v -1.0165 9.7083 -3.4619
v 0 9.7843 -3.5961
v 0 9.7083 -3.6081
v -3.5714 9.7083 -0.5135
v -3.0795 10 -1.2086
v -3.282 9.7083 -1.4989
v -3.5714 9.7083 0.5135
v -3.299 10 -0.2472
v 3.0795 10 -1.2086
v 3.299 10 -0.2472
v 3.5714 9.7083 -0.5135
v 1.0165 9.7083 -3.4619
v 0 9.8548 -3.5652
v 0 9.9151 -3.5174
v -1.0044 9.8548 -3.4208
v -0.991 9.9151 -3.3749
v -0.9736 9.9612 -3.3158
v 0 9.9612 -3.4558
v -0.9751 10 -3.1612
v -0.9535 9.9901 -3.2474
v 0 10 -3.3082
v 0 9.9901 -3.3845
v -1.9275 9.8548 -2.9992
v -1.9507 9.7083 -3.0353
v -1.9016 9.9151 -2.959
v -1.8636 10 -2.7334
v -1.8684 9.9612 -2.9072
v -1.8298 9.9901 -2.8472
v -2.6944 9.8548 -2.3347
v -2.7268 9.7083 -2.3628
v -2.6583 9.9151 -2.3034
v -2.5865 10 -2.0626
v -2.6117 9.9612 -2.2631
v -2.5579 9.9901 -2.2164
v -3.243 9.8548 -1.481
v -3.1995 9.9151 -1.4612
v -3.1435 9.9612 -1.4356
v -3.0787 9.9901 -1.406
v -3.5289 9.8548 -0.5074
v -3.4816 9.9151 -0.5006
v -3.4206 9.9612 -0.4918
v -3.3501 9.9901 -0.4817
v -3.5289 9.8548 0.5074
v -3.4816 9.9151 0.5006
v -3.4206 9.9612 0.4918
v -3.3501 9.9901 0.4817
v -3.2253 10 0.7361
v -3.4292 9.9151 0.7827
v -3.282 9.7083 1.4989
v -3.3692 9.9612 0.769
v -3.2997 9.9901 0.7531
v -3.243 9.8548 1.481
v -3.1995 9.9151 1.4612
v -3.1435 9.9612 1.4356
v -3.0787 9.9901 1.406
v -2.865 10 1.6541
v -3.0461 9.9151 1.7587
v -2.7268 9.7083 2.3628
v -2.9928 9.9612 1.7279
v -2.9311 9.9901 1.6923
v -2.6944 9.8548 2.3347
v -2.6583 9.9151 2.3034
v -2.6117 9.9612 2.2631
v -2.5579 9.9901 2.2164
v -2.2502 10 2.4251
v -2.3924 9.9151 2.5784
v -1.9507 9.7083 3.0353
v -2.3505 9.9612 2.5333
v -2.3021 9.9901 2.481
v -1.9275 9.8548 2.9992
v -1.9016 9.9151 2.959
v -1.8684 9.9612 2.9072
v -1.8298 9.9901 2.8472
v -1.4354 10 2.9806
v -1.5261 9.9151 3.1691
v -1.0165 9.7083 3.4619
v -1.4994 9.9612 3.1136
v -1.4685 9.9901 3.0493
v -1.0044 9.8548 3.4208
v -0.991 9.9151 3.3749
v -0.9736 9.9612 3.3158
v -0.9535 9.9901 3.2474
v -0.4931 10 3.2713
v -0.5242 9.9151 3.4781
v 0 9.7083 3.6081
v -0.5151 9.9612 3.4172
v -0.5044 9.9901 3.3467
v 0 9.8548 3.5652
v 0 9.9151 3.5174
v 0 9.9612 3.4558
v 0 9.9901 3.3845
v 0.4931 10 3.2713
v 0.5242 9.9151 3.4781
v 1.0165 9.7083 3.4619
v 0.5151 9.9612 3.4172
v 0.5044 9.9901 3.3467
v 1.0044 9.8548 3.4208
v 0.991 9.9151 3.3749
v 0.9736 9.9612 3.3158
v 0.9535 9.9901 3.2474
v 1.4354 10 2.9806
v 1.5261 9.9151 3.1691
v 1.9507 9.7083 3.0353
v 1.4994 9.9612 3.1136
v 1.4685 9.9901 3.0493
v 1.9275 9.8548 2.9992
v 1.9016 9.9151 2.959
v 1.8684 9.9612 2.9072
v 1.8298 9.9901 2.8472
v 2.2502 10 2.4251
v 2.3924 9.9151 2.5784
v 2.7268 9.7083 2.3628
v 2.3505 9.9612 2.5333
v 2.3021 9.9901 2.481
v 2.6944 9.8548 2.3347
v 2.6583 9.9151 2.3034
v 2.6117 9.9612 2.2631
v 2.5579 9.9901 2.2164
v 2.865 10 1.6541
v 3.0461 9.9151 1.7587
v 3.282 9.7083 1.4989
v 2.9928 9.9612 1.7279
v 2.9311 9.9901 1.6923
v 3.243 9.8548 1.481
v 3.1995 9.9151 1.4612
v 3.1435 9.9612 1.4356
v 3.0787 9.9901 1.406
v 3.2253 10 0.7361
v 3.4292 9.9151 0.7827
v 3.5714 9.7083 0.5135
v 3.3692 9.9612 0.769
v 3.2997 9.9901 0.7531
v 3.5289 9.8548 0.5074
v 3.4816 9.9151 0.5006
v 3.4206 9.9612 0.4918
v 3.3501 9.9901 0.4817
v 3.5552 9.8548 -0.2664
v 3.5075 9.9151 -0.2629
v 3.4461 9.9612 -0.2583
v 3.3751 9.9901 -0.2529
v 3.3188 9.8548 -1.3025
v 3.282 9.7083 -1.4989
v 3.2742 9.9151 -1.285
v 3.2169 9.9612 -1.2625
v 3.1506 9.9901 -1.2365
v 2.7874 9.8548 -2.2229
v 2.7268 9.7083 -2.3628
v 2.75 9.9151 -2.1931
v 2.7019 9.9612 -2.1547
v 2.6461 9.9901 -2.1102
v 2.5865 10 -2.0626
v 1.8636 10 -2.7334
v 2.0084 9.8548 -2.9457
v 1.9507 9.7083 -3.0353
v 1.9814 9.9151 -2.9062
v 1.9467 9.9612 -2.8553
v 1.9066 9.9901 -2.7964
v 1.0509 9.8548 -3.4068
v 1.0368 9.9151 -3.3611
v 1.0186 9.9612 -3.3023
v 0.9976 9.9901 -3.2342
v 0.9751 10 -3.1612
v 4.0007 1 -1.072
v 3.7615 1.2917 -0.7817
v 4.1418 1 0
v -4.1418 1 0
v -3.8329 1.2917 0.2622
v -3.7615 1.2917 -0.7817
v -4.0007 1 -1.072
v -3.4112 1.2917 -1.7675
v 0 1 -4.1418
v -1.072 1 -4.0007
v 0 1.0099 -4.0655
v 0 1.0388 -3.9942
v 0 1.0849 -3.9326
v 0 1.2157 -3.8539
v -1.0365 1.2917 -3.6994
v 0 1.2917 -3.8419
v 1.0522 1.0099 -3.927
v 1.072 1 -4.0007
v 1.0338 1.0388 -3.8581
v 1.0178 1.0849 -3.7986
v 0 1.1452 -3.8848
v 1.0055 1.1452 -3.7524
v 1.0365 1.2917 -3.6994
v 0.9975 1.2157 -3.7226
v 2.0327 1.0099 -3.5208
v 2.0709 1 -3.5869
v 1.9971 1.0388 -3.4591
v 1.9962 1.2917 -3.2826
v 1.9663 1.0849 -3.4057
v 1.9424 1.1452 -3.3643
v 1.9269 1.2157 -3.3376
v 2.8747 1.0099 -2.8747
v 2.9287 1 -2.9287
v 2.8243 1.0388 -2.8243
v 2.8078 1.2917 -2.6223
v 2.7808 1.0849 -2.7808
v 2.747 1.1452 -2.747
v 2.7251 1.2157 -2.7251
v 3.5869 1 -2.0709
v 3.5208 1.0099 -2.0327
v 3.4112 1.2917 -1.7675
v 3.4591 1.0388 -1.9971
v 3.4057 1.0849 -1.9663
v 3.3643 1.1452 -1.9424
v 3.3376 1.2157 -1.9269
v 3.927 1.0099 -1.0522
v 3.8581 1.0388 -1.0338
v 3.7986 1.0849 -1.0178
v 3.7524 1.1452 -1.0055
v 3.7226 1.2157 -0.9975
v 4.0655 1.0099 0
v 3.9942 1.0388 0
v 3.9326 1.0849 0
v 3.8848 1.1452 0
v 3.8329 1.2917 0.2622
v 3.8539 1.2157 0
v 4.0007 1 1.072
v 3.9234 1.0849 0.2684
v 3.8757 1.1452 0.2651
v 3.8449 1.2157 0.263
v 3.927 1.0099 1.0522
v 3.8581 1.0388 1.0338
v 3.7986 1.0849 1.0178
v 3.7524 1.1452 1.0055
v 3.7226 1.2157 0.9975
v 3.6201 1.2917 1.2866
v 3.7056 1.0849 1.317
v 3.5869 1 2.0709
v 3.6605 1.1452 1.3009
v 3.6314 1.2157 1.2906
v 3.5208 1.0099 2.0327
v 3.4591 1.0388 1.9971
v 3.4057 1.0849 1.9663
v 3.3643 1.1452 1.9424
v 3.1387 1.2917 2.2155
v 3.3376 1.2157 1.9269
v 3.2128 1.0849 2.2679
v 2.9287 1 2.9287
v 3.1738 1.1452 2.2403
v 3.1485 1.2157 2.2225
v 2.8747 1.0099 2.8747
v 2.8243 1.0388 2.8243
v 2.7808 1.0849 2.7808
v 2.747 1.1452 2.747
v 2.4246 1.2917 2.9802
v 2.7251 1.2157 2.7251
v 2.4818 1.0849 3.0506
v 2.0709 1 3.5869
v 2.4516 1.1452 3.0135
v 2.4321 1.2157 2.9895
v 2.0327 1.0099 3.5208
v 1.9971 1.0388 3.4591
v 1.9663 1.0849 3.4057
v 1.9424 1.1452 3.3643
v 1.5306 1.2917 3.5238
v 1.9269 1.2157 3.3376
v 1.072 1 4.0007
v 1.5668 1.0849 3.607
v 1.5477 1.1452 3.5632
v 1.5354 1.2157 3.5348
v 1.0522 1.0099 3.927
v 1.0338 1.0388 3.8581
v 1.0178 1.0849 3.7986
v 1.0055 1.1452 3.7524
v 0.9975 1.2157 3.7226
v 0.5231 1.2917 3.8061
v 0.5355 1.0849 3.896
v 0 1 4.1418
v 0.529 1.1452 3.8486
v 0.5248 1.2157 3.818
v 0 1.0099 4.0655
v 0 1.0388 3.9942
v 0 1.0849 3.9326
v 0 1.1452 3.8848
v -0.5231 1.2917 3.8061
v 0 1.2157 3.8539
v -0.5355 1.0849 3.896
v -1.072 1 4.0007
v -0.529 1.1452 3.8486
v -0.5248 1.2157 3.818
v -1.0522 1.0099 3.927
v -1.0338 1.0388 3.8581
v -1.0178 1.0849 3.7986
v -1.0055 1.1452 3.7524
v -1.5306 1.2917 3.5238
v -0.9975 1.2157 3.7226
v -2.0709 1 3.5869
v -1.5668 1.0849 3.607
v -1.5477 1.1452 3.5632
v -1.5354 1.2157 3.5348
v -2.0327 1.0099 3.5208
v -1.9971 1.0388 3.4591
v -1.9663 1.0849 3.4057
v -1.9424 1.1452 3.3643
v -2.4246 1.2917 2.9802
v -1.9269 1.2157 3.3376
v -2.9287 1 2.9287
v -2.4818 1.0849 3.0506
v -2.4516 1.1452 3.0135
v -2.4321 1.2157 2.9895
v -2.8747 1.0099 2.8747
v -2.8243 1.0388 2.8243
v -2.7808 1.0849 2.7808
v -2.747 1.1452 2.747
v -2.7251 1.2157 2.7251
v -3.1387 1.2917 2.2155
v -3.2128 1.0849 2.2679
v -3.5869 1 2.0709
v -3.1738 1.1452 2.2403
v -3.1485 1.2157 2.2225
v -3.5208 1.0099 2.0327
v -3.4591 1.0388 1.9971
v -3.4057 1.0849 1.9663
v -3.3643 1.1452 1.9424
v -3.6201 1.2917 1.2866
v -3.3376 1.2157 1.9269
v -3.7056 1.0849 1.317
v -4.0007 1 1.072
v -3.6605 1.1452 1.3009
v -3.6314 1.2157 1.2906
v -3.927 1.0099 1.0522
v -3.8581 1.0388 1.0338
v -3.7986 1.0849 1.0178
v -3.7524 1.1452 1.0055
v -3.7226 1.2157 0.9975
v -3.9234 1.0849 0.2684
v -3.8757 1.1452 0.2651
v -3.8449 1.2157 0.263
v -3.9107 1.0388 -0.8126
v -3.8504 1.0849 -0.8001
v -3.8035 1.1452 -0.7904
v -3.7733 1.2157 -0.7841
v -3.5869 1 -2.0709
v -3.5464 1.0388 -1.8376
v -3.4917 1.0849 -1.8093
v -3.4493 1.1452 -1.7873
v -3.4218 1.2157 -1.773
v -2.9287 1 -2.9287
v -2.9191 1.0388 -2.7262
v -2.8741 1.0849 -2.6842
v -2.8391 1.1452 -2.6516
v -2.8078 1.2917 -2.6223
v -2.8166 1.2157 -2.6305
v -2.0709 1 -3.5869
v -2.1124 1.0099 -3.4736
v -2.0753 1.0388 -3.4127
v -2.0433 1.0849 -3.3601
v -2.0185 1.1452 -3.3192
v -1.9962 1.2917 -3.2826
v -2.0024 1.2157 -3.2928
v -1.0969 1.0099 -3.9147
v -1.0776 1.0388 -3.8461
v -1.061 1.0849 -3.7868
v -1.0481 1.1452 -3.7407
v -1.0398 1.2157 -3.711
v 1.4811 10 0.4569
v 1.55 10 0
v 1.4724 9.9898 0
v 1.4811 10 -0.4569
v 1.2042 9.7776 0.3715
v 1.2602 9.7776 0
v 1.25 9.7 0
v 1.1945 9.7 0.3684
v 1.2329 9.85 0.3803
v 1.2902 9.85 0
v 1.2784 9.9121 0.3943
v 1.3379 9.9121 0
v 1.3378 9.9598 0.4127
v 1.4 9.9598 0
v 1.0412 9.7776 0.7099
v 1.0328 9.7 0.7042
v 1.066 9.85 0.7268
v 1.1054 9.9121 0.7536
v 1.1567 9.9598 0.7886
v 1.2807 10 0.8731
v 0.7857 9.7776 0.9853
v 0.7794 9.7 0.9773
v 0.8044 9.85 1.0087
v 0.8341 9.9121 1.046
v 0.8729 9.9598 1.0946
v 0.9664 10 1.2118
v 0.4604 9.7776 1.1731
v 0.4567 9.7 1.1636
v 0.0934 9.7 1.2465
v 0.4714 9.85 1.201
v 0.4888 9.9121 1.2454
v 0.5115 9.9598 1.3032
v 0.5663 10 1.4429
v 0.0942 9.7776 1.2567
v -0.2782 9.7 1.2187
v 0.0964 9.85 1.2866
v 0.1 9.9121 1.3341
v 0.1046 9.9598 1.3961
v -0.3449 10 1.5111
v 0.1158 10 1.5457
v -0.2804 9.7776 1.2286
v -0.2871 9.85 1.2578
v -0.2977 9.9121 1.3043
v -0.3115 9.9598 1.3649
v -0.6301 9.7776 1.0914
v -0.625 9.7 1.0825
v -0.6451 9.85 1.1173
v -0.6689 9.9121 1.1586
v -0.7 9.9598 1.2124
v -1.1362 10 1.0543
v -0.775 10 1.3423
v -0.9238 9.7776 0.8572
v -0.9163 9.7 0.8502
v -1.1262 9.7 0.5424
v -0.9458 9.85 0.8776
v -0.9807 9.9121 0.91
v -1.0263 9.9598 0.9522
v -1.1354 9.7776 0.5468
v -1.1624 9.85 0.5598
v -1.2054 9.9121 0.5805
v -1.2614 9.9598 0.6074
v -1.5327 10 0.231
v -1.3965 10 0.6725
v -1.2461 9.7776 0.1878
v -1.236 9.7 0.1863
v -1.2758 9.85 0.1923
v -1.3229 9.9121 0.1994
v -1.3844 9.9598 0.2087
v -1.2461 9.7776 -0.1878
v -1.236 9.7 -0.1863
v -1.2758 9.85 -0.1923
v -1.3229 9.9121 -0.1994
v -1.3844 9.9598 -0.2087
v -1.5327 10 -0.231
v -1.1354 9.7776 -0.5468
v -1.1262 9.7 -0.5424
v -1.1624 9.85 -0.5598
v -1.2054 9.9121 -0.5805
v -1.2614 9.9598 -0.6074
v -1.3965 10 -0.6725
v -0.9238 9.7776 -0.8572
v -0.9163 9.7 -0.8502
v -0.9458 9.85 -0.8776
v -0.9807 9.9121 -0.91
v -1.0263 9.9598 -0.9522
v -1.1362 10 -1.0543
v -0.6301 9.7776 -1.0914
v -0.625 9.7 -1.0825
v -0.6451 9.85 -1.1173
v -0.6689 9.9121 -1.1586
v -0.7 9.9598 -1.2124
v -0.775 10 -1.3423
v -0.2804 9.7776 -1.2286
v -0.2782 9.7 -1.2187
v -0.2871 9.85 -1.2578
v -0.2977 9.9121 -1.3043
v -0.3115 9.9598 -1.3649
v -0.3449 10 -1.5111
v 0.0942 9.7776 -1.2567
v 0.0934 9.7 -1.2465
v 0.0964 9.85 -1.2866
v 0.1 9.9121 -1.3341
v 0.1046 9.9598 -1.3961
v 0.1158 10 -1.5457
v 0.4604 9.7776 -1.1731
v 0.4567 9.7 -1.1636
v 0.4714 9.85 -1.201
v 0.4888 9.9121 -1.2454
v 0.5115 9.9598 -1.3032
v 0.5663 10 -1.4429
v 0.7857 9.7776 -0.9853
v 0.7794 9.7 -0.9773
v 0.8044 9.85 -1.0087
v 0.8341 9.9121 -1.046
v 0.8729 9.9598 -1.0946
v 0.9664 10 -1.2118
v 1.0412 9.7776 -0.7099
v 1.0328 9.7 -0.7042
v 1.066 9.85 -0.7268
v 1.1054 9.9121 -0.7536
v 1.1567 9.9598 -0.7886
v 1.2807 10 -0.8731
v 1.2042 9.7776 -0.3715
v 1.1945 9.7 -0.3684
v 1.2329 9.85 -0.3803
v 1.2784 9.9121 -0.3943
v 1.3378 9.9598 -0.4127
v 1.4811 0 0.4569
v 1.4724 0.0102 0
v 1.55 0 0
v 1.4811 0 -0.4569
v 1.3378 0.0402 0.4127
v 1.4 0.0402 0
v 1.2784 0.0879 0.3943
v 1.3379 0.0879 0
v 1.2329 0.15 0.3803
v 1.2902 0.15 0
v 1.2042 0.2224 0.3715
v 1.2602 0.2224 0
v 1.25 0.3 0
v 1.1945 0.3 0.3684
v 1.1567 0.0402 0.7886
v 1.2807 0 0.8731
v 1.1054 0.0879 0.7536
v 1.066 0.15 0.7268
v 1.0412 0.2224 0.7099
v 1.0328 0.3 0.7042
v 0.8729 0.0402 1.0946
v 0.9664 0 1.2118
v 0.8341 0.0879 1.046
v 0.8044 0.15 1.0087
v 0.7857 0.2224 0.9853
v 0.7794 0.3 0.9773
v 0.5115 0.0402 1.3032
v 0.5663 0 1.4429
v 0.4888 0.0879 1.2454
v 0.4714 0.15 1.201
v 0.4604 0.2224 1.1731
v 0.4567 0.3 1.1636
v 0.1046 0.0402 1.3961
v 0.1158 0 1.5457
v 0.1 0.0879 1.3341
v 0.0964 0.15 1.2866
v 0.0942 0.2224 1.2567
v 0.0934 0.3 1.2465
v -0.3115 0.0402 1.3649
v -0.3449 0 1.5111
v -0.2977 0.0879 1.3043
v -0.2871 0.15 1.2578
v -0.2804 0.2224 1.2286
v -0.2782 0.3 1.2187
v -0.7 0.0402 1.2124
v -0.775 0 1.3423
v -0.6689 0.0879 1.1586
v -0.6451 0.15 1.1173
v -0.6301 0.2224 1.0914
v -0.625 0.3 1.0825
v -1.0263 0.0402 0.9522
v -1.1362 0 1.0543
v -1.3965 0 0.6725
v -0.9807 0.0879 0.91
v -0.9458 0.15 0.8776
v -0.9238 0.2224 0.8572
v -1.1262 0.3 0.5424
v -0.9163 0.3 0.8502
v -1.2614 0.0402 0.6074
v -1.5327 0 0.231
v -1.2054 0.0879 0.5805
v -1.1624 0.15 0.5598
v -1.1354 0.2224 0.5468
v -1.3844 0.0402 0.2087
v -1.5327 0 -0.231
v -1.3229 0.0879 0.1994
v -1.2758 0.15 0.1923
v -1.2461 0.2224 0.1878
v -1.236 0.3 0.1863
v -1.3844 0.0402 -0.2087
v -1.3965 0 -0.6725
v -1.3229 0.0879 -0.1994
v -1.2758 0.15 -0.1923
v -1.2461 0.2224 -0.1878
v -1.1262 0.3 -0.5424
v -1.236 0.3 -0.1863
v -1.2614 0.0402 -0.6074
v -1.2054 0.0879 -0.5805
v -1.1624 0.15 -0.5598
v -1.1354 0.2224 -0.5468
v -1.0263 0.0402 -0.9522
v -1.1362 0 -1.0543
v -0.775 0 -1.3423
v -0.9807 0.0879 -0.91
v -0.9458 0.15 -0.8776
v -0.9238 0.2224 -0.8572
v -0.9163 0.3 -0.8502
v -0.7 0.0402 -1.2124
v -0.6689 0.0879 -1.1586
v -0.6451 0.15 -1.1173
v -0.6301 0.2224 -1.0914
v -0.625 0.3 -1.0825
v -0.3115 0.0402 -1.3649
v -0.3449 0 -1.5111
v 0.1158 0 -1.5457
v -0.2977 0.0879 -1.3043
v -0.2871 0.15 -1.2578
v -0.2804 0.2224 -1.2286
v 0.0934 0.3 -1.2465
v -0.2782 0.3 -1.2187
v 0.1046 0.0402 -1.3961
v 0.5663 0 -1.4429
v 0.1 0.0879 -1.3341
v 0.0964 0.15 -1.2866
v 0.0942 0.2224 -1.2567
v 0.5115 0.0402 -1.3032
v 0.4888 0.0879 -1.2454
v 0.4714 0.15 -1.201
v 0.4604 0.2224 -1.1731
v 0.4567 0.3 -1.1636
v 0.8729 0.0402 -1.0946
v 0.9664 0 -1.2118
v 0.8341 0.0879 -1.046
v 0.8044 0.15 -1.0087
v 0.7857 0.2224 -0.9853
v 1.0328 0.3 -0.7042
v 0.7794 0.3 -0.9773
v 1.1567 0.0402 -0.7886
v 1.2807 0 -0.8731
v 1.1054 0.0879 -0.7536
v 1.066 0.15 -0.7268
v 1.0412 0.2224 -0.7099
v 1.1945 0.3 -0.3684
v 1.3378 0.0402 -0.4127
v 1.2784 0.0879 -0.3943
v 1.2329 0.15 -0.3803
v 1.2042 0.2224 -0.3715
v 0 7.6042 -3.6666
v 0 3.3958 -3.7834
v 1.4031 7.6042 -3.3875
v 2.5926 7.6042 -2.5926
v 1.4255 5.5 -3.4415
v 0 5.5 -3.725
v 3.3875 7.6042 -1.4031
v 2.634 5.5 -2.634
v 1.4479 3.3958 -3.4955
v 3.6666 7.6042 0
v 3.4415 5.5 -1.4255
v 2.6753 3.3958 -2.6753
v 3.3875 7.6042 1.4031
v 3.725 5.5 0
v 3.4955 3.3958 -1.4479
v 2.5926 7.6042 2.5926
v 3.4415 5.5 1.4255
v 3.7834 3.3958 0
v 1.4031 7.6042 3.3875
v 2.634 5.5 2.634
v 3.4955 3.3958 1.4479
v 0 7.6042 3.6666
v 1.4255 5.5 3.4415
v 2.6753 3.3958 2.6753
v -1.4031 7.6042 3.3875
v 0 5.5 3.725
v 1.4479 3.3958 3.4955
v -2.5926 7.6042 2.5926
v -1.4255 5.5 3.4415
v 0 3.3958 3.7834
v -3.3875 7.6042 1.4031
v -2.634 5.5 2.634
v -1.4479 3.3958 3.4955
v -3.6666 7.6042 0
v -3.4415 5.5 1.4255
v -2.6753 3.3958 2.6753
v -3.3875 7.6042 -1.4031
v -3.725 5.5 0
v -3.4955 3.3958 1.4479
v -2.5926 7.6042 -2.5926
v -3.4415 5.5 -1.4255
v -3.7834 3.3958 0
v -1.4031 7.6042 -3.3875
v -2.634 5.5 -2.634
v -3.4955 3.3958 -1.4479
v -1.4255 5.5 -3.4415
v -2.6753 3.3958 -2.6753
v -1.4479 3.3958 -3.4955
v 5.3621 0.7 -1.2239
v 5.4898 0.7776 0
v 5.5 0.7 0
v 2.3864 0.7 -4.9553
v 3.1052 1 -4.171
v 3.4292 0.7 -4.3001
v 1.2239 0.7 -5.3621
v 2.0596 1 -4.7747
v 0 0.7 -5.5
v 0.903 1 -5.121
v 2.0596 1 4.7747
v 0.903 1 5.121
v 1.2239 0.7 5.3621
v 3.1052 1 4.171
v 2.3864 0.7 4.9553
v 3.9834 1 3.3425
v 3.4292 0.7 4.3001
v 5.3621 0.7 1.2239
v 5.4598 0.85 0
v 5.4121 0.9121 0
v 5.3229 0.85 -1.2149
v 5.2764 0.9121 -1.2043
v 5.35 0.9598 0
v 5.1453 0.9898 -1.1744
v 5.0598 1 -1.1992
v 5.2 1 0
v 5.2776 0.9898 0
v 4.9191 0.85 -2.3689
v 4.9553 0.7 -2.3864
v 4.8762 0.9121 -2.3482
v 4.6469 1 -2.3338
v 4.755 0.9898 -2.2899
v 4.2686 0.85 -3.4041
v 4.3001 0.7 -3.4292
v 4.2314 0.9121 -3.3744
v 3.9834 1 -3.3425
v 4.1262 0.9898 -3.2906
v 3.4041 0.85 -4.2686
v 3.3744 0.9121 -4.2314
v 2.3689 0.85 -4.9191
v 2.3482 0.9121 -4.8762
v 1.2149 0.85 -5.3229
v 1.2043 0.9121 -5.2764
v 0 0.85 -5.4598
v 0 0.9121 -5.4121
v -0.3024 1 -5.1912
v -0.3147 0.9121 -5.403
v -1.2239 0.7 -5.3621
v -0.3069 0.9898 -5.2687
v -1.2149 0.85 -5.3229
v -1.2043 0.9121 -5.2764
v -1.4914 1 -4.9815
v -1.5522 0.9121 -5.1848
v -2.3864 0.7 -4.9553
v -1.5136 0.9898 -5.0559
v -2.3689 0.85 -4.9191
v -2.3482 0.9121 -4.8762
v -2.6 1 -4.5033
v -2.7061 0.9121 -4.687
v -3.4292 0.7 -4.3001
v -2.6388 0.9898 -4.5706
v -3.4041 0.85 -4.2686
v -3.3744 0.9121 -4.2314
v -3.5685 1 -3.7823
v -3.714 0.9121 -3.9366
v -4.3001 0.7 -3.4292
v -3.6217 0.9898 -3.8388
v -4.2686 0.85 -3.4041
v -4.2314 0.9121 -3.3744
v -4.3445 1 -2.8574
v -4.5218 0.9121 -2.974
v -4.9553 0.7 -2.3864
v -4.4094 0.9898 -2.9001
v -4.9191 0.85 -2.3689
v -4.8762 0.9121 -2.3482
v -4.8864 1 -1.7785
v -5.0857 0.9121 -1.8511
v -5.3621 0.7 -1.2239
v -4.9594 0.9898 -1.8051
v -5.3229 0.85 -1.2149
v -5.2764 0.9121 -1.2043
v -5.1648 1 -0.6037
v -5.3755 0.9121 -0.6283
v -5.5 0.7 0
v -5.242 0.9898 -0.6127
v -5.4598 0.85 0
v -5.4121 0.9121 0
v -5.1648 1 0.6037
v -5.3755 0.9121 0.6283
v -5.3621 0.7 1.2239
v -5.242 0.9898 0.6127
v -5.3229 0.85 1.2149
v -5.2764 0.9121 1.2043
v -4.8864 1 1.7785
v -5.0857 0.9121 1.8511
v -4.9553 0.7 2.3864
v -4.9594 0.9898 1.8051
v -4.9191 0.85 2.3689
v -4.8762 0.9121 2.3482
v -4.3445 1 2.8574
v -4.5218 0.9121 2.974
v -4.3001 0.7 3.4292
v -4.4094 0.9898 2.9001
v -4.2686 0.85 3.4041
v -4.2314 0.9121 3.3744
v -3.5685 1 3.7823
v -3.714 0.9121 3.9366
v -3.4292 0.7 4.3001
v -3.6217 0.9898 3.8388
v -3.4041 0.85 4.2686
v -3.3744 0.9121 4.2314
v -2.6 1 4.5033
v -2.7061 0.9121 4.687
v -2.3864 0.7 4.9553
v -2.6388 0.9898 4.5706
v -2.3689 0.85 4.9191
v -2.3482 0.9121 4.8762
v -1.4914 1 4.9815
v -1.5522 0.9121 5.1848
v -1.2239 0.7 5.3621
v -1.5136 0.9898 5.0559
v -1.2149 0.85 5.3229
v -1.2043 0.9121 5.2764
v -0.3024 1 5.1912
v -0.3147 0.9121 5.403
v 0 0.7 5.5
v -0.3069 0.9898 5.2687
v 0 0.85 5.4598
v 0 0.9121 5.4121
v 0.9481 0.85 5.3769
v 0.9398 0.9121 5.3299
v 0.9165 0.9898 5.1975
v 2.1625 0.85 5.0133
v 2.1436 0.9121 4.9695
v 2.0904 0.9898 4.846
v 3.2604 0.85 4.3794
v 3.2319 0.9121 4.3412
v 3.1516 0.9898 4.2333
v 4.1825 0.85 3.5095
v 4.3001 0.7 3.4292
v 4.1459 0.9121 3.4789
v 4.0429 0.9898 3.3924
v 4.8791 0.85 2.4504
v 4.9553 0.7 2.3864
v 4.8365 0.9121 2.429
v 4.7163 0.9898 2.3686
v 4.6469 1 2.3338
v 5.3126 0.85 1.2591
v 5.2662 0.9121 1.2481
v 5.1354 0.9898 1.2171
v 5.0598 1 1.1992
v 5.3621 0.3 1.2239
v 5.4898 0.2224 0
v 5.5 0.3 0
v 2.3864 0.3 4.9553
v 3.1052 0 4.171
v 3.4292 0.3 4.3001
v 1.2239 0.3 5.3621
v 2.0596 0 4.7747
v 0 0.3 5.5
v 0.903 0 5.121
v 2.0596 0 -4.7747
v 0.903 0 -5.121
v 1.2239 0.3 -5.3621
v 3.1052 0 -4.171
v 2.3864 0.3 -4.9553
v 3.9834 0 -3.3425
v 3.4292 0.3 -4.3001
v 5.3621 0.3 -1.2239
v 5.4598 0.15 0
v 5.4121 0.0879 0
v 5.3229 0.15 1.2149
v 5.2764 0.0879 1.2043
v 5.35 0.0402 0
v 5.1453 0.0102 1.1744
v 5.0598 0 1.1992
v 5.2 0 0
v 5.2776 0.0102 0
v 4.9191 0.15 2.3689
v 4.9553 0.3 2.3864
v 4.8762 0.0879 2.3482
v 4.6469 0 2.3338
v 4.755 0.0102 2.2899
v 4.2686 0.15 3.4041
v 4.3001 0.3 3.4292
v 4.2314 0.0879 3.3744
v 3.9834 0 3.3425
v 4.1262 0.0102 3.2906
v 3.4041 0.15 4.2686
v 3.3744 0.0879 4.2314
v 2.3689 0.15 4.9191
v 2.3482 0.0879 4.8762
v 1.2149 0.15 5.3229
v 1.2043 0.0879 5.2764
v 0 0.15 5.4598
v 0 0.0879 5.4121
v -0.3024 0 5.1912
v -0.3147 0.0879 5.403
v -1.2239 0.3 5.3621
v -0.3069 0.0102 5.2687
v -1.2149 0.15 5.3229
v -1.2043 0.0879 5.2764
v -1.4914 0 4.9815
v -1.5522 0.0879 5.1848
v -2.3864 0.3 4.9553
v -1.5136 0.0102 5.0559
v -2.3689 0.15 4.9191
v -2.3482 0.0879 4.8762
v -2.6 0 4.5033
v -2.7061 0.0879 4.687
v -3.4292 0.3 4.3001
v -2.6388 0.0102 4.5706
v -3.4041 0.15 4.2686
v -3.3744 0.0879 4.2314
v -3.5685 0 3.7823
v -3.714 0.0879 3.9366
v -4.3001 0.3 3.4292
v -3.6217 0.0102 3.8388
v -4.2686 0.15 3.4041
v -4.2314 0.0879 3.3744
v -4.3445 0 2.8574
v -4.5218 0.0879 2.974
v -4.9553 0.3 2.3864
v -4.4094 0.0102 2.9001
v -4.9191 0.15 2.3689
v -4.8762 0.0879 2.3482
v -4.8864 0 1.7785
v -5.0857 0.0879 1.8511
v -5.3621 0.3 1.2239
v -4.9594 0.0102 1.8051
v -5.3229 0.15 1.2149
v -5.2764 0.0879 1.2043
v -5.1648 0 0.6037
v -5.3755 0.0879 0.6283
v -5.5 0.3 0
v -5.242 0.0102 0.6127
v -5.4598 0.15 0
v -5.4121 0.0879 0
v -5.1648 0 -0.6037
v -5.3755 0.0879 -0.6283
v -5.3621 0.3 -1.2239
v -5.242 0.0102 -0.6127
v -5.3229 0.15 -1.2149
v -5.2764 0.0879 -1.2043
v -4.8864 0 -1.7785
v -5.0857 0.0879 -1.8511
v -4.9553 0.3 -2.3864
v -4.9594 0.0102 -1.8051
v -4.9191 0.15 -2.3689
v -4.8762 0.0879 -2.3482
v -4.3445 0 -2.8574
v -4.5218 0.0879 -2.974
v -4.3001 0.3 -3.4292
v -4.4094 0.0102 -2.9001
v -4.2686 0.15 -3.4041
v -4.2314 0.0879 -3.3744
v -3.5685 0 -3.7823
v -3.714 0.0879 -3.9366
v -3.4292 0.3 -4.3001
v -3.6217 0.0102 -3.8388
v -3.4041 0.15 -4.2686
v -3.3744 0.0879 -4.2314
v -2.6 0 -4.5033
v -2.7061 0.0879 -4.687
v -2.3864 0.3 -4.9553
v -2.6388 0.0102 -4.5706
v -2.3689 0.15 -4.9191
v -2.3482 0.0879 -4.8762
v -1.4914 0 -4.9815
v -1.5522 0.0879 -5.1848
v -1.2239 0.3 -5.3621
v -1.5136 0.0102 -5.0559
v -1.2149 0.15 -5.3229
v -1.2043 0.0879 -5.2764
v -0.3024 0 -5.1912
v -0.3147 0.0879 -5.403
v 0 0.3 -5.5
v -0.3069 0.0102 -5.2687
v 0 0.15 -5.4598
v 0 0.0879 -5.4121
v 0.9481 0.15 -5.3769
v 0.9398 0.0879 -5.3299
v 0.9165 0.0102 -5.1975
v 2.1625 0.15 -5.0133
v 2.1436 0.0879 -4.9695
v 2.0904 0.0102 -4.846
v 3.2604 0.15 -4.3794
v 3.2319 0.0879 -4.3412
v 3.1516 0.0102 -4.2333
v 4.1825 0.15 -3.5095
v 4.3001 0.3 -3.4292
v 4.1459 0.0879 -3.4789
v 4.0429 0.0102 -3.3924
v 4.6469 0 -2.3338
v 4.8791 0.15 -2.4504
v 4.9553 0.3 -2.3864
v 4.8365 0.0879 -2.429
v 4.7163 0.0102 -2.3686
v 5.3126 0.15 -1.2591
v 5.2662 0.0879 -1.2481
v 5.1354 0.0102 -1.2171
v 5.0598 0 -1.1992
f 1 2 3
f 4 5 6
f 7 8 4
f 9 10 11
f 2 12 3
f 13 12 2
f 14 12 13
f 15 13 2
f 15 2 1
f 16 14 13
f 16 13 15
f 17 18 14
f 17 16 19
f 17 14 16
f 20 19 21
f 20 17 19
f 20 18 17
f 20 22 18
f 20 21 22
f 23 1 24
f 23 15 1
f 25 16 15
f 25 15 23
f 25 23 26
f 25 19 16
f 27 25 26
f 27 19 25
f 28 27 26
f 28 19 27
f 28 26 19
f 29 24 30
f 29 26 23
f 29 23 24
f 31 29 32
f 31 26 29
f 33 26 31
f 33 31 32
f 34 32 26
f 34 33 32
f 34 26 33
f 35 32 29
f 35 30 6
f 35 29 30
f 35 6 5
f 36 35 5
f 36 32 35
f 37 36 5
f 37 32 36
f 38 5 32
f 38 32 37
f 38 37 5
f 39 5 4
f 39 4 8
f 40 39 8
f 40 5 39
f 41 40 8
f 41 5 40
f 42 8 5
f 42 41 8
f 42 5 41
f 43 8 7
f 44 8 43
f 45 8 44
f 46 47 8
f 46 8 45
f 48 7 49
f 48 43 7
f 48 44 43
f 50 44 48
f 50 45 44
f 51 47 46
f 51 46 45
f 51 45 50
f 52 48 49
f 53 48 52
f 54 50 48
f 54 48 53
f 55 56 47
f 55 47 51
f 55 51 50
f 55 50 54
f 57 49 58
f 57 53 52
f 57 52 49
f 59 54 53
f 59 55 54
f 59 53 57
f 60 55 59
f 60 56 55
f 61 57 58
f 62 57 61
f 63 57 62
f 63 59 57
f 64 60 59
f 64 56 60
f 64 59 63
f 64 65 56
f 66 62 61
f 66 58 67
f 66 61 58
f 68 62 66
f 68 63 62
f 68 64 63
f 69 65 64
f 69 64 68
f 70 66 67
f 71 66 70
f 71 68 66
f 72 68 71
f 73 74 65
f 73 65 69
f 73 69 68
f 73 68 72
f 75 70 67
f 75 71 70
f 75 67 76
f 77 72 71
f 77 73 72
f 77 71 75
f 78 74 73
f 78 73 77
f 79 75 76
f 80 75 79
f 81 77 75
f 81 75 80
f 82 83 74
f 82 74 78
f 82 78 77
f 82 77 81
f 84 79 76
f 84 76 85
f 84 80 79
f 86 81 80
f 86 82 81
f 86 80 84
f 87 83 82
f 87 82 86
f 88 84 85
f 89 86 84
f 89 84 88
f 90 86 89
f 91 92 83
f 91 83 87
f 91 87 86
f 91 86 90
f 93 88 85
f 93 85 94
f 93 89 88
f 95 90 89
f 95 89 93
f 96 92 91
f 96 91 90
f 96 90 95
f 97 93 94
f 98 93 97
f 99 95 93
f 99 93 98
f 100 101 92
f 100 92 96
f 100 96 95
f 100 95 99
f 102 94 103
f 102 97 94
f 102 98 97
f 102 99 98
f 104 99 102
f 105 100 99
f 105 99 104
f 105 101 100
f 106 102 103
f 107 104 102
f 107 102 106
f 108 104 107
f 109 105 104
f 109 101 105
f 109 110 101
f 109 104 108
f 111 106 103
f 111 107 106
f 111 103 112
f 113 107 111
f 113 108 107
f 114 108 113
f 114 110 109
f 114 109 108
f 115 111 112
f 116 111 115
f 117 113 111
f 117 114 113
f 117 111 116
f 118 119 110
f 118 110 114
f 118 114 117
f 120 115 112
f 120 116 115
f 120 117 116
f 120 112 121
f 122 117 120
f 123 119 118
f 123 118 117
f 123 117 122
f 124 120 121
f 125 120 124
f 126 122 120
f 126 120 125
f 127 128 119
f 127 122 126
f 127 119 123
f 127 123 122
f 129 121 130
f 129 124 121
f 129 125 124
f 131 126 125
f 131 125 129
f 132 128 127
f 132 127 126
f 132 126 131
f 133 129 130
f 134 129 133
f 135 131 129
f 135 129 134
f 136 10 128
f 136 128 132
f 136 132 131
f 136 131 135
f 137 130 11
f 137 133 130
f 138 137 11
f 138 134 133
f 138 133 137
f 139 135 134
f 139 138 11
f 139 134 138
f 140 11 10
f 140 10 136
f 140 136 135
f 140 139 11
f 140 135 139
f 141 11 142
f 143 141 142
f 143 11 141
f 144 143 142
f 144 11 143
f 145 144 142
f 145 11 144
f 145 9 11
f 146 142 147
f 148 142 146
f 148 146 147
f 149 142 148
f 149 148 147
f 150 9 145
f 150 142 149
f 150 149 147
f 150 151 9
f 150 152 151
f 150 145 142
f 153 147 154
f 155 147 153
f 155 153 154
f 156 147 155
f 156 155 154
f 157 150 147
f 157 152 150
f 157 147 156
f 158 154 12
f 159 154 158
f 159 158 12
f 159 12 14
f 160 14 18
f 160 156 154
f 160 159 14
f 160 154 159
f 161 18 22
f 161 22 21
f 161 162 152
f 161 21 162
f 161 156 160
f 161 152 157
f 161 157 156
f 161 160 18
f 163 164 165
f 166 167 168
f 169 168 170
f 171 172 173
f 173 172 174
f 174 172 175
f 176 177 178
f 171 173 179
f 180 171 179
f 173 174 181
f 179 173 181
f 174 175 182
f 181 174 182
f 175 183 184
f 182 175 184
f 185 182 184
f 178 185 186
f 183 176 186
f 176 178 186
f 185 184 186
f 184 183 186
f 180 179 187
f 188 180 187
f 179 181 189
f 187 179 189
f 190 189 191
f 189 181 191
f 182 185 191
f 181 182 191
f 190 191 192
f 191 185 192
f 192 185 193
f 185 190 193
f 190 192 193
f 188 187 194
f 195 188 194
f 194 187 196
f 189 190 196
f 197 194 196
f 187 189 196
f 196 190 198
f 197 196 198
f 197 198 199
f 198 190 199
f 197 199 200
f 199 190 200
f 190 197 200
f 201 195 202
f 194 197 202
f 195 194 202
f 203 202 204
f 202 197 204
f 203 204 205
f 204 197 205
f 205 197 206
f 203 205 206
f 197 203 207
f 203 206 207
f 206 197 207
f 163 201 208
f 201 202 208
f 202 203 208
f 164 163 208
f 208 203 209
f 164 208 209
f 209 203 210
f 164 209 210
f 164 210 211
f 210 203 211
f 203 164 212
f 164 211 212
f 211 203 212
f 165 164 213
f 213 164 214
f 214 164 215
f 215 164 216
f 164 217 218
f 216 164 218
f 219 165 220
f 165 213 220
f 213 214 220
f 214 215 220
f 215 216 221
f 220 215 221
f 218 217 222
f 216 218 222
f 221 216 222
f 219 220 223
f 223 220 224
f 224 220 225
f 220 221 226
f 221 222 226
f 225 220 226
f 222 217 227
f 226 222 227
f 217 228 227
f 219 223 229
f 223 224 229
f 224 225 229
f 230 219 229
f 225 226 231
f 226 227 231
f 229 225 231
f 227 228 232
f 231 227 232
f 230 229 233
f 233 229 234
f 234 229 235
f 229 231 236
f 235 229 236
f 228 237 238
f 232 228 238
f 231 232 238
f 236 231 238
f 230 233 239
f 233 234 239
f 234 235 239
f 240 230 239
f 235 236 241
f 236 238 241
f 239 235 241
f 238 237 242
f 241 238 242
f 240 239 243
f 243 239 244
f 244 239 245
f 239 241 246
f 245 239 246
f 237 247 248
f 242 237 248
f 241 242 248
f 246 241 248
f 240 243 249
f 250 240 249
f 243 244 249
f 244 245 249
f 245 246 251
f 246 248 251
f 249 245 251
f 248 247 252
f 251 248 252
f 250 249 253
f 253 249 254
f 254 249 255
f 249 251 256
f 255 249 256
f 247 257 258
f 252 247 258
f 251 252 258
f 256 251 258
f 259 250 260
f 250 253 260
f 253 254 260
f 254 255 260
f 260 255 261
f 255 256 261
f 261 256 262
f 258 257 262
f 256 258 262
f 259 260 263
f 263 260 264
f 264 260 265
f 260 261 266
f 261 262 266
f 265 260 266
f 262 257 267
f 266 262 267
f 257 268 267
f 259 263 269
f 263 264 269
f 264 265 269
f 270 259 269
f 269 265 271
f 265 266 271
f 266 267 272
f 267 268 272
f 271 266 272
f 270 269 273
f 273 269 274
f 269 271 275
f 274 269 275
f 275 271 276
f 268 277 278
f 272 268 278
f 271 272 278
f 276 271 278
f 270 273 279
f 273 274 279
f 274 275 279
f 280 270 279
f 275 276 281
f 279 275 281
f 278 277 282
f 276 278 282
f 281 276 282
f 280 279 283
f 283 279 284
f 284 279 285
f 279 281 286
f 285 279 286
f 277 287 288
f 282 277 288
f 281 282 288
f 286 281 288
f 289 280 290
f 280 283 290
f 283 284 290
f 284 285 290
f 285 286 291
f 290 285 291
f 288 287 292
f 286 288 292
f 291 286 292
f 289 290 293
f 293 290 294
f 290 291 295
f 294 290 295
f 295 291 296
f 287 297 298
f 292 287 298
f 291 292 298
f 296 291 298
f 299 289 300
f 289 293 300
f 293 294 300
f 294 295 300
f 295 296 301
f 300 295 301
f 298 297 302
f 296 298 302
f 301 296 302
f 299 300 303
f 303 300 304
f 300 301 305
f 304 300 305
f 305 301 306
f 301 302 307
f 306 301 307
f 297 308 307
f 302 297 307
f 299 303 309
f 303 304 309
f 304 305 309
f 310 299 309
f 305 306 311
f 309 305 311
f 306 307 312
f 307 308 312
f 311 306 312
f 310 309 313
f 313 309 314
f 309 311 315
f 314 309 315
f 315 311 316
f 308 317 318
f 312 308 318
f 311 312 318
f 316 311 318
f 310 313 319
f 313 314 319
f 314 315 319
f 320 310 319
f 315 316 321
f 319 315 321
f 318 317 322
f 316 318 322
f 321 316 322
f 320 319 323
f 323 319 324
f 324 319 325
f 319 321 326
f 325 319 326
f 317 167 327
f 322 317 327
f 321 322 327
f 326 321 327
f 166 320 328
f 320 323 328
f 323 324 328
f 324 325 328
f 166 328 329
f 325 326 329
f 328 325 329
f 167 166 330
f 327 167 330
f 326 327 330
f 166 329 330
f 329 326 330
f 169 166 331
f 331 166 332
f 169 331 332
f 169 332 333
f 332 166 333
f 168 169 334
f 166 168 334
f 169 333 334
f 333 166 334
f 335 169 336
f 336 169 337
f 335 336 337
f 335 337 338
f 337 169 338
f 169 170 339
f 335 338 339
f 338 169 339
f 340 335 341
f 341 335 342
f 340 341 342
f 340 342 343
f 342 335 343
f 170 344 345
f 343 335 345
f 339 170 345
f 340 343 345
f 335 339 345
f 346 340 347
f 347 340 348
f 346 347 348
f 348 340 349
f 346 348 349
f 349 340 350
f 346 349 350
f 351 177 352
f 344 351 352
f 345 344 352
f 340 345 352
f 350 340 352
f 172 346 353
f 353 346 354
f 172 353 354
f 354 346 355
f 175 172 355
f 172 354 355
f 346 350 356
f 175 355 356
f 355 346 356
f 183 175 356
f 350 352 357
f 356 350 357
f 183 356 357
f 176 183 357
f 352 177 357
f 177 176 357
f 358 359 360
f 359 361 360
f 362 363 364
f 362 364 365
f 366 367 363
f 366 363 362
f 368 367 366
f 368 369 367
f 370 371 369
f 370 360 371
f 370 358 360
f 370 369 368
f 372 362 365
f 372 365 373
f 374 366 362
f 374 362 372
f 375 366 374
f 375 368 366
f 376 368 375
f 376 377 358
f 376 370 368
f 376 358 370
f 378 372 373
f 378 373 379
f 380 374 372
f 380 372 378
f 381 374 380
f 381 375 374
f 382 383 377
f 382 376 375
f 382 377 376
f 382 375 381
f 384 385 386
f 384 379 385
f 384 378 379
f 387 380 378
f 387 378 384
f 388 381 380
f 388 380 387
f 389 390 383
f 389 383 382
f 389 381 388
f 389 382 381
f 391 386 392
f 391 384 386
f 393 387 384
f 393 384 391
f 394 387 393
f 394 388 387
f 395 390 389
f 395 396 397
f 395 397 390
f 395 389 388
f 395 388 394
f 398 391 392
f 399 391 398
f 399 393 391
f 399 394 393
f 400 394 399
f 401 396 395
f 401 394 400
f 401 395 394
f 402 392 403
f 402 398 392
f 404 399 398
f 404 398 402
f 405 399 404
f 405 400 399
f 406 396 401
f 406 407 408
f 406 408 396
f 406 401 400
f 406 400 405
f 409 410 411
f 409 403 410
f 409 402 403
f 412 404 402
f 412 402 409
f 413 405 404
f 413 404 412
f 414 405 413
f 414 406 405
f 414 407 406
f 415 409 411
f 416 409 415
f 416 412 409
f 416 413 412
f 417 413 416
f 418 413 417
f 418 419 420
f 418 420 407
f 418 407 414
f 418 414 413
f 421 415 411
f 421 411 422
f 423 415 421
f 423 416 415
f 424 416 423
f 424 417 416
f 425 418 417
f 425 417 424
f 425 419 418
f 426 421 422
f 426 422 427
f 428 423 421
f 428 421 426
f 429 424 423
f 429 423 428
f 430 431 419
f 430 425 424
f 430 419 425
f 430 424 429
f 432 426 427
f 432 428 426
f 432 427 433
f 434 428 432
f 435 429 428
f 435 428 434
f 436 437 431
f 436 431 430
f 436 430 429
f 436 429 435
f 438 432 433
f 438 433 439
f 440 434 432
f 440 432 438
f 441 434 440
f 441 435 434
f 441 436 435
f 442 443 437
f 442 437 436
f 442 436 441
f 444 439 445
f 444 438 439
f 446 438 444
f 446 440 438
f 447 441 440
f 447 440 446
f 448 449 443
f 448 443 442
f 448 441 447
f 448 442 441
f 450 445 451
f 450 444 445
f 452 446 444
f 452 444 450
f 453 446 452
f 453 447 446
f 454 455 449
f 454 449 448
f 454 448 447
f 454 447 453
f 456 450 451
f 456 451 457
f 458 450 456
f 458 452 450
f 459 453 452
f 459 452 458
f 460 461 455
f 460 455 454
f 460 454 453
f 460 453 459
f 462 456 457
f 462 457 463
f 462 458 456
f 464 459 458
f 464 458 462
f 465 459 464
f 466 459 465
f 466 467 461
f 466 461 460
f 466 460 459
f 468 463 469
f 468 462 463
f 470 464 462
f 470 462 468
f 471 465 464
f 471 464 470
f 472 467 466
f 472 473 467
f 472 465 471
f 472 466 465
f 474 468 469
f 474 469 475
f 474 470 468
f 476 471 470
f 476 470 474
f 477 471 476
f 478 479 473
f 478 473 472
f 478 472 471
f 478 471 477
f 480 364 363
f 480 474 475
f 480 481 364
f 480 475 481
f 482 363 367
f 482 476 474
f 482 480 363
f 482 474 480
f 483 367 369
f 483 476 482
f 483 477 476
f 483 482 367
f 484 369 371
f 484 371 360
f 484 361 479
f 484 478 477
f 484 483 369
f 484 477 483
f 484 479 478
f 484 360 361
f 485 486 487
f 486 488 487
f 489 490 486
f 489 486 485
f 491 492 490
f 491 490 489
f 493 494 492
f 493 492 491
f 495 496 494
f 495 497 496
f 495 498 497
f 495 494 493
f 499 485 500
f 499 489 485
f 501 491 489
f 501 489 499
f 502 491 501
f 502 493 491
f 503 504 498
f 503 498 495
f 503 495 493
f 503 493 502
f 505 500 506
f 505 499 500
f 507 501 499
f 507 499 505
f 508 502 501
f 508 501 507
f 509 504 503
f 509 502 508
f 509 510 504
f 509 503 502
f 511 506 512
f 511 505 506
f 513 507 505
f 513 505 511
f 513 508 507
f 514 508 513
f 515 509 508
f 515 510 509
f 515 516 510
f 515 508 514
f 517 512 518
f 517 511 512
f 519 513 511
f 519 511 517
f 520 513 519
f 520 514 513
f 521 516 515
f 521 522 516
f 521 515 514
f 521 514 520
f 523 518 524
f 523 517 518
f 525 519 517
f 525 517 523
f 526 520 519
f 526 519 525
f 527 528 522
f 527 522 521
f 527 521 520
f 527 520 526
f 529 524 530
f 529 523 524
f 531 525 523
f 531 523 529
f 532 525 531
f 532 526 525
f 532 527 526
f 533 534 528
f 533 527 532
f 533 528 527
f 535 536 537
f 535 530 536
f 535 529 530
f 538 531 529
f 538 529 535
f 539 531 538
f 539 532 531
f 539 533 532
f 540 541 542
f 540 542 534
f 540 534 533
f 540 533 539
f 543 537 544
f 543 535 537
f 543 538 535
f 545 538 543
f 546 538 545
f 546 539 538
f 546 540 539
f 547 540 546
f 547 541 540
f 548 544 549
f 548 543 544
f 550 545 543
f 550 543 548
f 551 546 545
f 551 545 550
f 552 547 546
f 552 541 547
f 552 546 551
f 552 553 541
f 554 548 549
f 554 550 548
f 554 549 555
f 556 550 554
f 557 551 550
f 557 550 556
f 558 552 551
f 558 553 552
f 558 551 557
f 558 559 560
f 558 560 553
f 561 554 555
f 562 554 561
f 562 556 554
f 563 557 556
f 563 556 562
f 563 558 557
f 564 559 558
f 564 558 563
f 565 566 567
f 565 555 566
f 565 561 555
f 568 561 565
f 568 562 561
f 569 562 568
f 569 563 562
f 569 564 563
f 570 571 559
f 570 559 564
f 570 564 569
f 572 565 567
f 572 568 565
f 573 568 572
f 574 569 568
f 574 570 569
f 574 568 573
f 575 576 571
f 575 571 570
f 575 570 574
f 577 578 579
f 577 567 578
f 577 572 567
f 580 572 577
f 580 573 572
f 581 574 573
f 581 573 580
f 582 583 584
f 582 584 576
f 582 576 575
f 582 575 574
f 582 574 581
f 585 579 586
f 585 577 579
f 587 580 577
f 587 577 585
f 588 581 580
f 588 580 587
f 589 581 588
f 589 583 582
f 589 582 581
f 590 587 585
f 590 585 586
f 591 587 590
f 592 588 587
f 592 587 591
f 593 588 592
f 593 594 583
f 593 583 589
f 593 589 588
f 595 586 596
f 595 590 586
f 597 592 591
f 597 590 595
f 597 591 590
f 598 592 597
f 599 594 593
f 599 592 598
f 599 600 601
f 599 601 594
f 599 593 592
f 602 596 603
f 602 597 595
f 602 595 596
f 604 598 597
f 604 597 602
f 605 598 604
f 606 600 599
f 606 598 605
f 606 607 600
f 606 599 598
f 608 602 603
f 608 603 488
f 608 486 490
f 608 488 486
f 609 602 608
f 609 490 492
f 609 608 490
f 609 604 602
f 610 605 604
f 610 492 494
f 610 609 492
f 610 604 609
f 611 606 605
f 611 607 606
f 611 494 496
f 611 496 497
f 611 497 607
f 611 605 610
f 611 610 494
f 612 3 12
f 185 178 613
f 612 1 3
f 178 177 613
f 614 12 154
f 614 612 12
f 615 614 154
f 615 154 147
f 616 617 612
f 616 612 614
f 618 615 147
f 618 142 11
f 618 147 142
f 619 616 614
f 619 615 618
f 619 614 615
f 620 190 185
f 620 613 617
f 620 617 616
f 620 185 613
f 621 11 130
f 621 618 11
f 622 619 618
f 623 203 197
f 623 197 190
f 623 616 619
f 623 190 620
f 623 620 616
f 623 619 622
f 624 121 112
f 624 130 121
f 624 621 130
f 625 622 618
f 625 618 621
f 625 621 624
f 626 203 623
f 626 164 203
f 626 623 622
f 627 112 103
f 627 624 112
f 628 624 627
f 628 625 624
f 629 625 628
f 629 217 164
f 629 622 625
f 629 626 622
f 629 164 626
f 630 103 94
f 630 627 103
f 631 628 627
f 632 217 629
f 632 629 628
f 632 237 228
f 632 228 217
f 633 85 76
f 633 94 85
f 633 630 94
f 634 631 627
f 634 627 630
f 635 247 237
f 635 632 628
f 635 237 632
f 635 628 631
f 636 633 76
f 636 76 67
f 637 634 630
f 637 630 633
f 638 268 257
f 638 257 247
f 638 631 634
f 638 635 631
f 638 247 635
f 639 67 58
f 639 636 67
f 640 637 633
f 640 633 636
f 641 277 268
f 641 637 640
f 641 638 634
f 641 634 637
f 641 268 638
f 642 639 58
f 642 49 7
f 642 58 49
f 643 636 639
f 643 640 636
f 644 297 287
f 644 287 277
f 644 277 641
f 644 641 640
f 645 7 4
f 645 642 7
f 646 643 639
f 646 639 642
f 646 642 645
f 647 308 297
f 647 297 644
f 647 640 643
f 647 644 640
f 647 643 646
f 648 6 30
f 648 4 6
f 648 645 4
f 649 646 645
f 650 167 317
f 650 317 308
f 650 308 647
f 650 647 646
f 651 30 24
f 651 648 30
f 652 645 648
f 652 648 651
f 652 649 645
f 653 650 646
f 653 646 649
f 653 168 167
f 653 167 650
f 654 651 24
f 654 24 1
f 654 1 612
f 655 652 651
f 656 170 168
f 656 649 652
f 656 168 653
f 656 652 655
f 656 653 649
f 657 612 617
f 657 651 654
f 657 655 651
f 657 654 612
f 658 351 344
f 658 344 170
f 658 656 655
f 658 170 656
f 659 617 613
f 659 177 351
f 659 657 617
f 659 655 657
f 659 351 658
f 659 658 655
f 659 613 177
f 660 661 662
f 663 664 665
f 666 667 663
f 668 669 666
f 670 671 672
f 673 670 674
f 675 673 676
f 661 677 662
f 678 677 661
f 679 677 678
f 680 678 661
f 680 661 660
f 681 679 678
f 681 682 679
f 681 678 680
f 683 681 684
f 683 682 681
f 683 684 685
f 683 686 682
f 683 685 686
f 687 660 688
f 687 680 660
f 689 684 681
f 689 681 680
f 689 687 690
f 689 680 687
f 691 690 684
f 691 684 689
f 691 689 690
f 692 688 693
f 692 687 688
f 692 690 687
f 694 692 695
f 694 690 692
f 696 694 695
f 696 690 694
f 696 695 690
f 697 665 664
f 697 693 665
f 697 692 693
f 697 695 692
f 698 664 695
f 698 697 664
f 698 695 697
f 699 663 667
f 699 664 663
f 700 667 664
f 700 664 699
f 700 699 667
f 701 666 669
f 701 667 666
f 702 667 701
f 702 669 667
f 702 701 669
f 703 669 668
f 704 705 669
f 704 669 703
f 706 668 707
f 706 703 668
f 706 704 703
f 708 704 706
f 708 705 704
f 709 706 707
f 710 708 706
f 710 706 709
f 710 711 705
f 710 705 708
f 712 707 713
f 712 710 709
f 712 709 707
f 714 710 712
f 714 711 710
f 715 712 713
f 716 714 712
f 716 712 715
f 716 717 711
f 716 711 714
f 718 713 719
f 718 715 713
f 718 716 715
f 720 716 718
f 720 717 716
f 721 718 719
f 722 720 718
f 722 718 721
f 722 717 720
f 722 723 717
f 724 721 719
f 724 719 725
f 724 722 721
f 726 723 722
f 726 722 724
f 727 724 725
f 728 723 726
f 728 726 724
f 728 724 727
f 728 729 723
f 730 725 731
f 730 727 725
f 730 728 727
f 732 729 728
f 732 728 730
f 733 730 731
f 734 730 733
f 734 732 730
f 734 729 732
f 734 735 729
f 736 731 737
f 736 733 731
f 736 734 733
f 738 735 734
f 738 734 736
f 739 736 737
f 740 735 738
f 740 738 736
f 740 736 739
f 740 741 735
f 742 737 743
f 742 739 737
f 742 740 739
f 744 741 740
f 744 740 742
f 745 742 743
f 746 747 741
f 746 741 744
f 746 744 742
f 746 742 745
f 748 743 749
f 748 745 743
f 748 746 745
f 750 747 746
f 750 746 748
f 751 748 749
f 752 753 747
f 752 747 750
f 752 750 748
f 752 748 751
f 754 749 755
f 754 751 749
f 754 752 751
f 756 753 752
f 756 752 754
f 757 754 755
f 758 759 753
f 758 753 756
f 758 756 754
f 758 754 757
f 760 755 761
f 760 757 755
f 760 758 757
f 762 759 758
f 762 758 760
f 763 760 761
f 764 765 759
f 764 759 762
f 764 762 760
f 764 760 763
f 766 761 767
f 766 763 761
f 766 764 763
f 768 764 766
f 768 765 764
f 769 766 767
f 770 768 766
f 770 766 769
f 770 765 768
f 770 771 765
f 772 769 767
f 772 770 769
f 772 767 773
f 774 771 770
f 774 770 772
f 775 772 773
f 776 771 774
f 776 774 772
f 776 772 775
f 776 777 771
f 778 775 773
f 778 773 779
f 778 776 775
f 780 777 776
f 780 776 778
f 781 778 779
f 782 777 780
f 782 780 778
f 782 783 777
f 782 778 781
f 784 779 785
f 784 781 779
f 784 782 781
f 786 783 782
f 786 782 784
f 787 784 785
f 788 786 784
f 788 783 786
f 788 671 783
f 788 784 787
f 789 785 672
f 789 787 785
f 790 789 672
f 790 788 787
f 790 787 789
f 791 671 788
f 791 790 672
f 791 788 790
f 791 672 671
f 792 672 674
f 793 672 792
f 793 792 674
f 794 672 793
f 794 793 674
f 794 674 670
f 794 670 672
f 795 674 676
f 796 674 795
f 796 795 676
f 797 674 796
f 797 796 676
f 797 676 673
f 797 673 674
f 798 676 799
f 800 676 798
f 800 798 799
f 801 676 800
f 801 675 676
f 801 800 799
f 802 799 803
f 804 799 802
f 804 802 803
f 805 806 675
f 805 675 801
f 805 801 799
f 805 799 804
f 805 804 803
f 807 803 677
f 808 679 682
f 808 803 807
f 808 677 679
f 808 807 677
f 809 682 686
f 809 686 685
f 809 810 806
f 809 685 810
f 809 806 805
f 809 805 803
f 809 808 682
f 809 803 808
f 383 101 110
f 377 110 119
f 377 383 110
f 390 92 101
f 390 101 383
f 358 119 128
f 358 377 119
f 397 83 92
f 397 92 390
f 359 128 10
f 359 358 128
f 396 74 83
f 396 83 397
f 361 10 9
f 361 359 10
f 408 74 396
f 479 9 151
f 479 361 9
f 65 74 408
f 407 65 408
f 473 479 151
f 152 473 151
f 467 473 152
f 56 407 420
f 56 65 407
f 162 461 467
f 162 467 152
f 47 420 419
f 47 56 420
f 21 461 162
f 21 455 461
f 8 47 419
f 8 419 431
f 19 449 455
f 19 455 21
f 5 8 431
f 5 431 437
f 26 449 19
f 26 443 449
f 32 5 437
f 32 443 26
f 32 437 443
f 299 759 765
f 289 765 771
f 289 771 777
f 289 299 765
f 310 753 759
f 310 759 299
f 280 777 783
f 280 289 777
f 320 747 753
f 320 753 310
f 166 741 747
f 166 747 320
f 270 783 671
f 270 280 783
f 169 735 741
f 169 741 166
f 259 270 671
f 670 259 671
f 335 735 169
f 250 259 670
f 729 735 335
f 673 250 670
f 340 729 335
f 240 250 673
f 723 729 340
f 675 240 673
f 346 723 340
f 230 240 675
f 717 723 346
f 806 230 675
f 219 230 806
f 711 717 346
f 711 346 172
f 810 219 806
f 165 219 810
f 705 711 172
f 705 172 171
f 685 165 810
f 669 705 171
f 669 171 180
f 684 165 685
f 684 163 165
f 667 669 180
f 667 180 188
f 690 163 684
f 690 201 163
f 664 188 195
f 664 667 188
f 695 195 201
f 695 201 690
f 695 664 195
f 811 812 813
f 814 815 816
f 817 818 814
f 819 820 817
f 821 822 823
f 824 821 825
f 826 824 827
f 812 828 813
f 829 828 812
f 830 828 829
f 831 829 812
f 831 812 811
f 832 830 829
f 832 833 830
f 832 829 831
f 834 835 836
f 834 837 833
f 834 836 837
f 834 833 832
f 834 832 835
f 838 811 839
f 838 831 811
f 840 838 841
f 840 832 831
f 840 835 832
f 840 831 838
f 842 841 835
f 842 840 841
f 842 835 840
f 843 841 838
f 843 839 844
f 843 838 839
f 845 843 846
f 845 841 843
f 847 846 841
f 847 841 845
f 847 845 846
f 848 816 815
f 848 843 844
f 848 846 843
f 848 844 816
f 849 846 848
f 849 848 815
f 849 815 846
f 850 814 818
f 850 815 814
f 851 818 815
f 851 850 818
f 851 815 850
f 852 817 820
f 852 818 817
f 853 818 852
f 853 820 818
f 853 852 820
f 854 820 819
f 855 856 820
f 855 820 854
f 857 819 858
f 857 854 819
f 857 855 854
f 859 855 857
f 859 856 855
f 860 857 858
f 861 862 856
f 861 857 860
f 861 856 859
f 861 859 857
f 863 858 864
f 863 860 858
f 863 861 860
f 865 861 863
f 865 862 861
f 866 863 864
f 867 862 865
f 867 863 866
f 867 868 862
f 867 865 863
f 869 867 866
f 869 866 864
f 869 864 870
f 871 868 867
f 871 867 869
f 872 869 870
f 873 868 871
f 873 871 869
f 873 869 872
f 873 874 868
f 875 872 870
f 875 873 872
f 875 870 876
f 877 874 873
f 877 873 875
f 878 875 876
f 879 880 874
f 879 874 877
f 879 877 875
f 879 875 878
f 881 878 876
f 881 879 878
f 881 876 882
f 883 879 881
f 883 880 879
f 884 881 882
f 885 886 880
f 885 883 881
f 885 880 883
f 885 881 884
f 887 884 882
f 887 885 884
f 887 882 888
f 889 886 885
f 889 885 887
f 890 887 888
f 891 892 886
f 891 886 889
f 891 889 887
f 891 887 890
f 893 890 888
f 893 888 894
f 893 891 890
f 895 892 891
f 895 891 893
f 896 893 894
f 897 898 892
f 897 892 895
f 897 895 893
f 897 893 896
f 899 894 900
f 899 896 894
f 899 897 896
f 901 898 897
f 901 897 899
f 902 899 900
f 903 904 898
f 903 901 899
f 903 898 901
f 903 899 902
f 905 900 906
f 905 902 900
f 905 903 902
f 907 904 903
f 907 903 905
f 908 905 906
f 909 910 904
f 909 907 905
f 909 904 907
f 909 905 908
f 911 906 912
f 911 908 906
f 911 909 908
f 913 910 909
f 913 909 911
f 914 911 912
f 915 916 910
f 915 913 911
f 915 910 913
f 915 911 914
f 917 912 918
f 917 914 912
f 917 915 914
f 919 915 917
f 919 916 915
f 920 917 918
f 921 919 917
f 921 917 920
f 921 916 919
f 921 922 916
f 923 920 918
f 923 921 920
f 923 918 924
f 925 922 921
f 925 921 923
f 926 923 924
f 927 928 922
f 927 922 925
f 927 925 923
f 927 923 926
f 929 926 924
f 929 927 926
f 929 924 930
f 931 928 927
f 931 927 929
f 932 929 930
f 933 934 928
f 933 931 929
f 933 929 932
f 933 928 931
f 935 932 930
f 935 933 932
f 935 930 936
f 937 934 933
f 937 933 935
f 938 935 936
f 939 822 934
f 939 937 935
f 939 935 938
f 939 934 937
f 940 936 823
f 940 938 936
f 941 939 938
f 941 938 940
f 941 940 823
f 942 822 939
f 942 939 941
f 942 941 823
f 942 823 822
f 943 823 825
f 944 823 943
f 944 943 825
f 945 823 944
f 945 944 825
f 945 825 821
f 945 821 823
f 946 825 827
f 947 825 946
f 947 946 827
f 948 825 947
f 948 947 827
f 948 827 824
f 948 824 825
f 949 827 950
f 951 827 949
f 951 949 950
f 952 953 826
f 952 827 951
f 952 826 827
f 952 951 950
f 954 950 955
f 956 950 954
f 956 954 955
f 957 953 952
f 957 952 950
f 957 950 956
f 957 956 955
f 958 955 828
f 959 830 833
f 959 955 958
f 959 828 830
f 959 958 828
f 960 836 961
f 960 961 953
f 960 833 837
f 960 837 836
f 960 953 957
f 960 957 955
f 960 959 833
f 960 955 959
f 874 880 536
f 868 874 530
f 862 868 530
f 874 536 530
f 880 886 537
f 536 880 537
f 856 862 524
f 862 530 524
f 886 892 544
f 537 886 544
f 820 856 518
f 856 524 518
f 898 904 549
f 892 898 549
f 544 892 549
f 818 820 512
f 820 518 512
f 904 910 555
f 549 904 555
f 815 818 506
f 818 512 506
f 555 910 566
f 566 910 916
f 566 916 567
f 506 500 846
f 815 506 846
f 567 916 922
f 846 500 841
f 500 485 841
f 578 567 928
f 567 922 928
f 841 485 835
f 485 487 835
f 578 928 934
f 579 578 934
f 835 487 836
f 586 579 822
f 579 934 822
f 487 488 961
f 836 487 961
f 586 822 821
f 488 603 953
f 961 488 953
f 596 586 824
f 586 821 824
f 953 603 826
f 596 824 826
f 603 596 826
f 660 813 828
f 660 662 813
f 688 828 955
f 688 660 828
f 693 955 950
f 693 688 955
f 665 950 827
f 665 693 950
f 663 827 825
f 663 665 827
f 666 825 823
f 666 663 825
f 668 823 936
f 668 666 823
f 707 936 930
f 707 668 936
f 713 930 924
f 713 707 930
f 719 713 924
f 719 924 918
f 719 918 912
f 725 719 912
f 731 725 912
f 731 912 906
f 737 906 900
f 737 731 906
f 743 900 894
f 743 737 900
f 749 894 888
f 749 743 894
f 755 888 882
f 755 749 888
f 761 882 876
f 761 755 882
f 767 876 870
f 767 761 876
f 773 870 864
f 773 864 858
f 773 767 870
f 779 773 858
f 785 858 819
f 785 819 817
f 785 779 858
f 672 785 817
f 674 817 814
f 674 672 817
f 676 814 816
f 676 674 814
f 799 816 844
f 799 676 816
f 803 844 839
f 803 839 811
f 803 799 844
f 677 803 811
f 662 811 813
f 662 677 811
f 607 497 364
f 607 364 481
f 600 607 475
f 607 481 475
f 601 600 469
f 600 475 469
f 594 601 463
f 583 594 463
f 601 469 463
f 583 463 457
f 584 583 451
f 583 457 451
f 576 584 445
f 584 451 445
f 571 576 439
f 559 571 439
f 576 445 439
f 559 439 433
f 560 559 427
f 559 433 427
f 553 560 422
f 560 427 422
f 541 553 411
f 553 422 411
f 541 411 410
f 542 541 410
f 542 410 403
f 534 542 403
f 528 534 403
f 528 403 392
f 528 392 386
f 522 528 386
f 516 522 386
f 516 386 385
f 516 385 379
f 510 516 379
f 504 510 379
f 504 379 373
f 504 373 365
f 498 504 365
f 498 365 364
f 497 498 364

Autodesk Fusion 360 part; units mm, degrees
cylinder "Grundkörper Zylinder1" add diameter 11 height 1 placed x (1, 0, 0) y (0, 0, -1) z (0, 1, 0) at (0, 0, 0)
sketch "Skizze2" plane through (0, 0, 0) normal (1, 0, 0) x (0, 0, -1)
  line L0 (0, 1) -> (0, 10)
  line L1 (0, 10) -> (3.6, 10)
  line L2 (0, 1) -> (3.85, 1)
  line L3 (3.85, 1) -> (3.6, 10)
  dimension "d3" = 3.6
  dimension "d4" = 3.85
  dimension "d5" = 9
revolve "Drehen1" add sketch "Skizze2" angle 360 about axis through (0, 1, 0) along (0, 1, 0)
cylinder "Grundkörper Zylinder2" cut diameter 2.5 height -23 placed x (1, 0, 0) y (0, 0, -1) z (0, 1, 0) at (0, 10, 0)
fillet "Abrundung1" radius 0.3 6 faces at (5.4727, 0.6667, 0.5476) (4.9259, 1, 0.3691) (0.21, 10, -2.8021) (1.2438, 6.6667, 0.1245) (4.0629, 0, 0.2732) (3.5528, 2.2, 1.3944)
